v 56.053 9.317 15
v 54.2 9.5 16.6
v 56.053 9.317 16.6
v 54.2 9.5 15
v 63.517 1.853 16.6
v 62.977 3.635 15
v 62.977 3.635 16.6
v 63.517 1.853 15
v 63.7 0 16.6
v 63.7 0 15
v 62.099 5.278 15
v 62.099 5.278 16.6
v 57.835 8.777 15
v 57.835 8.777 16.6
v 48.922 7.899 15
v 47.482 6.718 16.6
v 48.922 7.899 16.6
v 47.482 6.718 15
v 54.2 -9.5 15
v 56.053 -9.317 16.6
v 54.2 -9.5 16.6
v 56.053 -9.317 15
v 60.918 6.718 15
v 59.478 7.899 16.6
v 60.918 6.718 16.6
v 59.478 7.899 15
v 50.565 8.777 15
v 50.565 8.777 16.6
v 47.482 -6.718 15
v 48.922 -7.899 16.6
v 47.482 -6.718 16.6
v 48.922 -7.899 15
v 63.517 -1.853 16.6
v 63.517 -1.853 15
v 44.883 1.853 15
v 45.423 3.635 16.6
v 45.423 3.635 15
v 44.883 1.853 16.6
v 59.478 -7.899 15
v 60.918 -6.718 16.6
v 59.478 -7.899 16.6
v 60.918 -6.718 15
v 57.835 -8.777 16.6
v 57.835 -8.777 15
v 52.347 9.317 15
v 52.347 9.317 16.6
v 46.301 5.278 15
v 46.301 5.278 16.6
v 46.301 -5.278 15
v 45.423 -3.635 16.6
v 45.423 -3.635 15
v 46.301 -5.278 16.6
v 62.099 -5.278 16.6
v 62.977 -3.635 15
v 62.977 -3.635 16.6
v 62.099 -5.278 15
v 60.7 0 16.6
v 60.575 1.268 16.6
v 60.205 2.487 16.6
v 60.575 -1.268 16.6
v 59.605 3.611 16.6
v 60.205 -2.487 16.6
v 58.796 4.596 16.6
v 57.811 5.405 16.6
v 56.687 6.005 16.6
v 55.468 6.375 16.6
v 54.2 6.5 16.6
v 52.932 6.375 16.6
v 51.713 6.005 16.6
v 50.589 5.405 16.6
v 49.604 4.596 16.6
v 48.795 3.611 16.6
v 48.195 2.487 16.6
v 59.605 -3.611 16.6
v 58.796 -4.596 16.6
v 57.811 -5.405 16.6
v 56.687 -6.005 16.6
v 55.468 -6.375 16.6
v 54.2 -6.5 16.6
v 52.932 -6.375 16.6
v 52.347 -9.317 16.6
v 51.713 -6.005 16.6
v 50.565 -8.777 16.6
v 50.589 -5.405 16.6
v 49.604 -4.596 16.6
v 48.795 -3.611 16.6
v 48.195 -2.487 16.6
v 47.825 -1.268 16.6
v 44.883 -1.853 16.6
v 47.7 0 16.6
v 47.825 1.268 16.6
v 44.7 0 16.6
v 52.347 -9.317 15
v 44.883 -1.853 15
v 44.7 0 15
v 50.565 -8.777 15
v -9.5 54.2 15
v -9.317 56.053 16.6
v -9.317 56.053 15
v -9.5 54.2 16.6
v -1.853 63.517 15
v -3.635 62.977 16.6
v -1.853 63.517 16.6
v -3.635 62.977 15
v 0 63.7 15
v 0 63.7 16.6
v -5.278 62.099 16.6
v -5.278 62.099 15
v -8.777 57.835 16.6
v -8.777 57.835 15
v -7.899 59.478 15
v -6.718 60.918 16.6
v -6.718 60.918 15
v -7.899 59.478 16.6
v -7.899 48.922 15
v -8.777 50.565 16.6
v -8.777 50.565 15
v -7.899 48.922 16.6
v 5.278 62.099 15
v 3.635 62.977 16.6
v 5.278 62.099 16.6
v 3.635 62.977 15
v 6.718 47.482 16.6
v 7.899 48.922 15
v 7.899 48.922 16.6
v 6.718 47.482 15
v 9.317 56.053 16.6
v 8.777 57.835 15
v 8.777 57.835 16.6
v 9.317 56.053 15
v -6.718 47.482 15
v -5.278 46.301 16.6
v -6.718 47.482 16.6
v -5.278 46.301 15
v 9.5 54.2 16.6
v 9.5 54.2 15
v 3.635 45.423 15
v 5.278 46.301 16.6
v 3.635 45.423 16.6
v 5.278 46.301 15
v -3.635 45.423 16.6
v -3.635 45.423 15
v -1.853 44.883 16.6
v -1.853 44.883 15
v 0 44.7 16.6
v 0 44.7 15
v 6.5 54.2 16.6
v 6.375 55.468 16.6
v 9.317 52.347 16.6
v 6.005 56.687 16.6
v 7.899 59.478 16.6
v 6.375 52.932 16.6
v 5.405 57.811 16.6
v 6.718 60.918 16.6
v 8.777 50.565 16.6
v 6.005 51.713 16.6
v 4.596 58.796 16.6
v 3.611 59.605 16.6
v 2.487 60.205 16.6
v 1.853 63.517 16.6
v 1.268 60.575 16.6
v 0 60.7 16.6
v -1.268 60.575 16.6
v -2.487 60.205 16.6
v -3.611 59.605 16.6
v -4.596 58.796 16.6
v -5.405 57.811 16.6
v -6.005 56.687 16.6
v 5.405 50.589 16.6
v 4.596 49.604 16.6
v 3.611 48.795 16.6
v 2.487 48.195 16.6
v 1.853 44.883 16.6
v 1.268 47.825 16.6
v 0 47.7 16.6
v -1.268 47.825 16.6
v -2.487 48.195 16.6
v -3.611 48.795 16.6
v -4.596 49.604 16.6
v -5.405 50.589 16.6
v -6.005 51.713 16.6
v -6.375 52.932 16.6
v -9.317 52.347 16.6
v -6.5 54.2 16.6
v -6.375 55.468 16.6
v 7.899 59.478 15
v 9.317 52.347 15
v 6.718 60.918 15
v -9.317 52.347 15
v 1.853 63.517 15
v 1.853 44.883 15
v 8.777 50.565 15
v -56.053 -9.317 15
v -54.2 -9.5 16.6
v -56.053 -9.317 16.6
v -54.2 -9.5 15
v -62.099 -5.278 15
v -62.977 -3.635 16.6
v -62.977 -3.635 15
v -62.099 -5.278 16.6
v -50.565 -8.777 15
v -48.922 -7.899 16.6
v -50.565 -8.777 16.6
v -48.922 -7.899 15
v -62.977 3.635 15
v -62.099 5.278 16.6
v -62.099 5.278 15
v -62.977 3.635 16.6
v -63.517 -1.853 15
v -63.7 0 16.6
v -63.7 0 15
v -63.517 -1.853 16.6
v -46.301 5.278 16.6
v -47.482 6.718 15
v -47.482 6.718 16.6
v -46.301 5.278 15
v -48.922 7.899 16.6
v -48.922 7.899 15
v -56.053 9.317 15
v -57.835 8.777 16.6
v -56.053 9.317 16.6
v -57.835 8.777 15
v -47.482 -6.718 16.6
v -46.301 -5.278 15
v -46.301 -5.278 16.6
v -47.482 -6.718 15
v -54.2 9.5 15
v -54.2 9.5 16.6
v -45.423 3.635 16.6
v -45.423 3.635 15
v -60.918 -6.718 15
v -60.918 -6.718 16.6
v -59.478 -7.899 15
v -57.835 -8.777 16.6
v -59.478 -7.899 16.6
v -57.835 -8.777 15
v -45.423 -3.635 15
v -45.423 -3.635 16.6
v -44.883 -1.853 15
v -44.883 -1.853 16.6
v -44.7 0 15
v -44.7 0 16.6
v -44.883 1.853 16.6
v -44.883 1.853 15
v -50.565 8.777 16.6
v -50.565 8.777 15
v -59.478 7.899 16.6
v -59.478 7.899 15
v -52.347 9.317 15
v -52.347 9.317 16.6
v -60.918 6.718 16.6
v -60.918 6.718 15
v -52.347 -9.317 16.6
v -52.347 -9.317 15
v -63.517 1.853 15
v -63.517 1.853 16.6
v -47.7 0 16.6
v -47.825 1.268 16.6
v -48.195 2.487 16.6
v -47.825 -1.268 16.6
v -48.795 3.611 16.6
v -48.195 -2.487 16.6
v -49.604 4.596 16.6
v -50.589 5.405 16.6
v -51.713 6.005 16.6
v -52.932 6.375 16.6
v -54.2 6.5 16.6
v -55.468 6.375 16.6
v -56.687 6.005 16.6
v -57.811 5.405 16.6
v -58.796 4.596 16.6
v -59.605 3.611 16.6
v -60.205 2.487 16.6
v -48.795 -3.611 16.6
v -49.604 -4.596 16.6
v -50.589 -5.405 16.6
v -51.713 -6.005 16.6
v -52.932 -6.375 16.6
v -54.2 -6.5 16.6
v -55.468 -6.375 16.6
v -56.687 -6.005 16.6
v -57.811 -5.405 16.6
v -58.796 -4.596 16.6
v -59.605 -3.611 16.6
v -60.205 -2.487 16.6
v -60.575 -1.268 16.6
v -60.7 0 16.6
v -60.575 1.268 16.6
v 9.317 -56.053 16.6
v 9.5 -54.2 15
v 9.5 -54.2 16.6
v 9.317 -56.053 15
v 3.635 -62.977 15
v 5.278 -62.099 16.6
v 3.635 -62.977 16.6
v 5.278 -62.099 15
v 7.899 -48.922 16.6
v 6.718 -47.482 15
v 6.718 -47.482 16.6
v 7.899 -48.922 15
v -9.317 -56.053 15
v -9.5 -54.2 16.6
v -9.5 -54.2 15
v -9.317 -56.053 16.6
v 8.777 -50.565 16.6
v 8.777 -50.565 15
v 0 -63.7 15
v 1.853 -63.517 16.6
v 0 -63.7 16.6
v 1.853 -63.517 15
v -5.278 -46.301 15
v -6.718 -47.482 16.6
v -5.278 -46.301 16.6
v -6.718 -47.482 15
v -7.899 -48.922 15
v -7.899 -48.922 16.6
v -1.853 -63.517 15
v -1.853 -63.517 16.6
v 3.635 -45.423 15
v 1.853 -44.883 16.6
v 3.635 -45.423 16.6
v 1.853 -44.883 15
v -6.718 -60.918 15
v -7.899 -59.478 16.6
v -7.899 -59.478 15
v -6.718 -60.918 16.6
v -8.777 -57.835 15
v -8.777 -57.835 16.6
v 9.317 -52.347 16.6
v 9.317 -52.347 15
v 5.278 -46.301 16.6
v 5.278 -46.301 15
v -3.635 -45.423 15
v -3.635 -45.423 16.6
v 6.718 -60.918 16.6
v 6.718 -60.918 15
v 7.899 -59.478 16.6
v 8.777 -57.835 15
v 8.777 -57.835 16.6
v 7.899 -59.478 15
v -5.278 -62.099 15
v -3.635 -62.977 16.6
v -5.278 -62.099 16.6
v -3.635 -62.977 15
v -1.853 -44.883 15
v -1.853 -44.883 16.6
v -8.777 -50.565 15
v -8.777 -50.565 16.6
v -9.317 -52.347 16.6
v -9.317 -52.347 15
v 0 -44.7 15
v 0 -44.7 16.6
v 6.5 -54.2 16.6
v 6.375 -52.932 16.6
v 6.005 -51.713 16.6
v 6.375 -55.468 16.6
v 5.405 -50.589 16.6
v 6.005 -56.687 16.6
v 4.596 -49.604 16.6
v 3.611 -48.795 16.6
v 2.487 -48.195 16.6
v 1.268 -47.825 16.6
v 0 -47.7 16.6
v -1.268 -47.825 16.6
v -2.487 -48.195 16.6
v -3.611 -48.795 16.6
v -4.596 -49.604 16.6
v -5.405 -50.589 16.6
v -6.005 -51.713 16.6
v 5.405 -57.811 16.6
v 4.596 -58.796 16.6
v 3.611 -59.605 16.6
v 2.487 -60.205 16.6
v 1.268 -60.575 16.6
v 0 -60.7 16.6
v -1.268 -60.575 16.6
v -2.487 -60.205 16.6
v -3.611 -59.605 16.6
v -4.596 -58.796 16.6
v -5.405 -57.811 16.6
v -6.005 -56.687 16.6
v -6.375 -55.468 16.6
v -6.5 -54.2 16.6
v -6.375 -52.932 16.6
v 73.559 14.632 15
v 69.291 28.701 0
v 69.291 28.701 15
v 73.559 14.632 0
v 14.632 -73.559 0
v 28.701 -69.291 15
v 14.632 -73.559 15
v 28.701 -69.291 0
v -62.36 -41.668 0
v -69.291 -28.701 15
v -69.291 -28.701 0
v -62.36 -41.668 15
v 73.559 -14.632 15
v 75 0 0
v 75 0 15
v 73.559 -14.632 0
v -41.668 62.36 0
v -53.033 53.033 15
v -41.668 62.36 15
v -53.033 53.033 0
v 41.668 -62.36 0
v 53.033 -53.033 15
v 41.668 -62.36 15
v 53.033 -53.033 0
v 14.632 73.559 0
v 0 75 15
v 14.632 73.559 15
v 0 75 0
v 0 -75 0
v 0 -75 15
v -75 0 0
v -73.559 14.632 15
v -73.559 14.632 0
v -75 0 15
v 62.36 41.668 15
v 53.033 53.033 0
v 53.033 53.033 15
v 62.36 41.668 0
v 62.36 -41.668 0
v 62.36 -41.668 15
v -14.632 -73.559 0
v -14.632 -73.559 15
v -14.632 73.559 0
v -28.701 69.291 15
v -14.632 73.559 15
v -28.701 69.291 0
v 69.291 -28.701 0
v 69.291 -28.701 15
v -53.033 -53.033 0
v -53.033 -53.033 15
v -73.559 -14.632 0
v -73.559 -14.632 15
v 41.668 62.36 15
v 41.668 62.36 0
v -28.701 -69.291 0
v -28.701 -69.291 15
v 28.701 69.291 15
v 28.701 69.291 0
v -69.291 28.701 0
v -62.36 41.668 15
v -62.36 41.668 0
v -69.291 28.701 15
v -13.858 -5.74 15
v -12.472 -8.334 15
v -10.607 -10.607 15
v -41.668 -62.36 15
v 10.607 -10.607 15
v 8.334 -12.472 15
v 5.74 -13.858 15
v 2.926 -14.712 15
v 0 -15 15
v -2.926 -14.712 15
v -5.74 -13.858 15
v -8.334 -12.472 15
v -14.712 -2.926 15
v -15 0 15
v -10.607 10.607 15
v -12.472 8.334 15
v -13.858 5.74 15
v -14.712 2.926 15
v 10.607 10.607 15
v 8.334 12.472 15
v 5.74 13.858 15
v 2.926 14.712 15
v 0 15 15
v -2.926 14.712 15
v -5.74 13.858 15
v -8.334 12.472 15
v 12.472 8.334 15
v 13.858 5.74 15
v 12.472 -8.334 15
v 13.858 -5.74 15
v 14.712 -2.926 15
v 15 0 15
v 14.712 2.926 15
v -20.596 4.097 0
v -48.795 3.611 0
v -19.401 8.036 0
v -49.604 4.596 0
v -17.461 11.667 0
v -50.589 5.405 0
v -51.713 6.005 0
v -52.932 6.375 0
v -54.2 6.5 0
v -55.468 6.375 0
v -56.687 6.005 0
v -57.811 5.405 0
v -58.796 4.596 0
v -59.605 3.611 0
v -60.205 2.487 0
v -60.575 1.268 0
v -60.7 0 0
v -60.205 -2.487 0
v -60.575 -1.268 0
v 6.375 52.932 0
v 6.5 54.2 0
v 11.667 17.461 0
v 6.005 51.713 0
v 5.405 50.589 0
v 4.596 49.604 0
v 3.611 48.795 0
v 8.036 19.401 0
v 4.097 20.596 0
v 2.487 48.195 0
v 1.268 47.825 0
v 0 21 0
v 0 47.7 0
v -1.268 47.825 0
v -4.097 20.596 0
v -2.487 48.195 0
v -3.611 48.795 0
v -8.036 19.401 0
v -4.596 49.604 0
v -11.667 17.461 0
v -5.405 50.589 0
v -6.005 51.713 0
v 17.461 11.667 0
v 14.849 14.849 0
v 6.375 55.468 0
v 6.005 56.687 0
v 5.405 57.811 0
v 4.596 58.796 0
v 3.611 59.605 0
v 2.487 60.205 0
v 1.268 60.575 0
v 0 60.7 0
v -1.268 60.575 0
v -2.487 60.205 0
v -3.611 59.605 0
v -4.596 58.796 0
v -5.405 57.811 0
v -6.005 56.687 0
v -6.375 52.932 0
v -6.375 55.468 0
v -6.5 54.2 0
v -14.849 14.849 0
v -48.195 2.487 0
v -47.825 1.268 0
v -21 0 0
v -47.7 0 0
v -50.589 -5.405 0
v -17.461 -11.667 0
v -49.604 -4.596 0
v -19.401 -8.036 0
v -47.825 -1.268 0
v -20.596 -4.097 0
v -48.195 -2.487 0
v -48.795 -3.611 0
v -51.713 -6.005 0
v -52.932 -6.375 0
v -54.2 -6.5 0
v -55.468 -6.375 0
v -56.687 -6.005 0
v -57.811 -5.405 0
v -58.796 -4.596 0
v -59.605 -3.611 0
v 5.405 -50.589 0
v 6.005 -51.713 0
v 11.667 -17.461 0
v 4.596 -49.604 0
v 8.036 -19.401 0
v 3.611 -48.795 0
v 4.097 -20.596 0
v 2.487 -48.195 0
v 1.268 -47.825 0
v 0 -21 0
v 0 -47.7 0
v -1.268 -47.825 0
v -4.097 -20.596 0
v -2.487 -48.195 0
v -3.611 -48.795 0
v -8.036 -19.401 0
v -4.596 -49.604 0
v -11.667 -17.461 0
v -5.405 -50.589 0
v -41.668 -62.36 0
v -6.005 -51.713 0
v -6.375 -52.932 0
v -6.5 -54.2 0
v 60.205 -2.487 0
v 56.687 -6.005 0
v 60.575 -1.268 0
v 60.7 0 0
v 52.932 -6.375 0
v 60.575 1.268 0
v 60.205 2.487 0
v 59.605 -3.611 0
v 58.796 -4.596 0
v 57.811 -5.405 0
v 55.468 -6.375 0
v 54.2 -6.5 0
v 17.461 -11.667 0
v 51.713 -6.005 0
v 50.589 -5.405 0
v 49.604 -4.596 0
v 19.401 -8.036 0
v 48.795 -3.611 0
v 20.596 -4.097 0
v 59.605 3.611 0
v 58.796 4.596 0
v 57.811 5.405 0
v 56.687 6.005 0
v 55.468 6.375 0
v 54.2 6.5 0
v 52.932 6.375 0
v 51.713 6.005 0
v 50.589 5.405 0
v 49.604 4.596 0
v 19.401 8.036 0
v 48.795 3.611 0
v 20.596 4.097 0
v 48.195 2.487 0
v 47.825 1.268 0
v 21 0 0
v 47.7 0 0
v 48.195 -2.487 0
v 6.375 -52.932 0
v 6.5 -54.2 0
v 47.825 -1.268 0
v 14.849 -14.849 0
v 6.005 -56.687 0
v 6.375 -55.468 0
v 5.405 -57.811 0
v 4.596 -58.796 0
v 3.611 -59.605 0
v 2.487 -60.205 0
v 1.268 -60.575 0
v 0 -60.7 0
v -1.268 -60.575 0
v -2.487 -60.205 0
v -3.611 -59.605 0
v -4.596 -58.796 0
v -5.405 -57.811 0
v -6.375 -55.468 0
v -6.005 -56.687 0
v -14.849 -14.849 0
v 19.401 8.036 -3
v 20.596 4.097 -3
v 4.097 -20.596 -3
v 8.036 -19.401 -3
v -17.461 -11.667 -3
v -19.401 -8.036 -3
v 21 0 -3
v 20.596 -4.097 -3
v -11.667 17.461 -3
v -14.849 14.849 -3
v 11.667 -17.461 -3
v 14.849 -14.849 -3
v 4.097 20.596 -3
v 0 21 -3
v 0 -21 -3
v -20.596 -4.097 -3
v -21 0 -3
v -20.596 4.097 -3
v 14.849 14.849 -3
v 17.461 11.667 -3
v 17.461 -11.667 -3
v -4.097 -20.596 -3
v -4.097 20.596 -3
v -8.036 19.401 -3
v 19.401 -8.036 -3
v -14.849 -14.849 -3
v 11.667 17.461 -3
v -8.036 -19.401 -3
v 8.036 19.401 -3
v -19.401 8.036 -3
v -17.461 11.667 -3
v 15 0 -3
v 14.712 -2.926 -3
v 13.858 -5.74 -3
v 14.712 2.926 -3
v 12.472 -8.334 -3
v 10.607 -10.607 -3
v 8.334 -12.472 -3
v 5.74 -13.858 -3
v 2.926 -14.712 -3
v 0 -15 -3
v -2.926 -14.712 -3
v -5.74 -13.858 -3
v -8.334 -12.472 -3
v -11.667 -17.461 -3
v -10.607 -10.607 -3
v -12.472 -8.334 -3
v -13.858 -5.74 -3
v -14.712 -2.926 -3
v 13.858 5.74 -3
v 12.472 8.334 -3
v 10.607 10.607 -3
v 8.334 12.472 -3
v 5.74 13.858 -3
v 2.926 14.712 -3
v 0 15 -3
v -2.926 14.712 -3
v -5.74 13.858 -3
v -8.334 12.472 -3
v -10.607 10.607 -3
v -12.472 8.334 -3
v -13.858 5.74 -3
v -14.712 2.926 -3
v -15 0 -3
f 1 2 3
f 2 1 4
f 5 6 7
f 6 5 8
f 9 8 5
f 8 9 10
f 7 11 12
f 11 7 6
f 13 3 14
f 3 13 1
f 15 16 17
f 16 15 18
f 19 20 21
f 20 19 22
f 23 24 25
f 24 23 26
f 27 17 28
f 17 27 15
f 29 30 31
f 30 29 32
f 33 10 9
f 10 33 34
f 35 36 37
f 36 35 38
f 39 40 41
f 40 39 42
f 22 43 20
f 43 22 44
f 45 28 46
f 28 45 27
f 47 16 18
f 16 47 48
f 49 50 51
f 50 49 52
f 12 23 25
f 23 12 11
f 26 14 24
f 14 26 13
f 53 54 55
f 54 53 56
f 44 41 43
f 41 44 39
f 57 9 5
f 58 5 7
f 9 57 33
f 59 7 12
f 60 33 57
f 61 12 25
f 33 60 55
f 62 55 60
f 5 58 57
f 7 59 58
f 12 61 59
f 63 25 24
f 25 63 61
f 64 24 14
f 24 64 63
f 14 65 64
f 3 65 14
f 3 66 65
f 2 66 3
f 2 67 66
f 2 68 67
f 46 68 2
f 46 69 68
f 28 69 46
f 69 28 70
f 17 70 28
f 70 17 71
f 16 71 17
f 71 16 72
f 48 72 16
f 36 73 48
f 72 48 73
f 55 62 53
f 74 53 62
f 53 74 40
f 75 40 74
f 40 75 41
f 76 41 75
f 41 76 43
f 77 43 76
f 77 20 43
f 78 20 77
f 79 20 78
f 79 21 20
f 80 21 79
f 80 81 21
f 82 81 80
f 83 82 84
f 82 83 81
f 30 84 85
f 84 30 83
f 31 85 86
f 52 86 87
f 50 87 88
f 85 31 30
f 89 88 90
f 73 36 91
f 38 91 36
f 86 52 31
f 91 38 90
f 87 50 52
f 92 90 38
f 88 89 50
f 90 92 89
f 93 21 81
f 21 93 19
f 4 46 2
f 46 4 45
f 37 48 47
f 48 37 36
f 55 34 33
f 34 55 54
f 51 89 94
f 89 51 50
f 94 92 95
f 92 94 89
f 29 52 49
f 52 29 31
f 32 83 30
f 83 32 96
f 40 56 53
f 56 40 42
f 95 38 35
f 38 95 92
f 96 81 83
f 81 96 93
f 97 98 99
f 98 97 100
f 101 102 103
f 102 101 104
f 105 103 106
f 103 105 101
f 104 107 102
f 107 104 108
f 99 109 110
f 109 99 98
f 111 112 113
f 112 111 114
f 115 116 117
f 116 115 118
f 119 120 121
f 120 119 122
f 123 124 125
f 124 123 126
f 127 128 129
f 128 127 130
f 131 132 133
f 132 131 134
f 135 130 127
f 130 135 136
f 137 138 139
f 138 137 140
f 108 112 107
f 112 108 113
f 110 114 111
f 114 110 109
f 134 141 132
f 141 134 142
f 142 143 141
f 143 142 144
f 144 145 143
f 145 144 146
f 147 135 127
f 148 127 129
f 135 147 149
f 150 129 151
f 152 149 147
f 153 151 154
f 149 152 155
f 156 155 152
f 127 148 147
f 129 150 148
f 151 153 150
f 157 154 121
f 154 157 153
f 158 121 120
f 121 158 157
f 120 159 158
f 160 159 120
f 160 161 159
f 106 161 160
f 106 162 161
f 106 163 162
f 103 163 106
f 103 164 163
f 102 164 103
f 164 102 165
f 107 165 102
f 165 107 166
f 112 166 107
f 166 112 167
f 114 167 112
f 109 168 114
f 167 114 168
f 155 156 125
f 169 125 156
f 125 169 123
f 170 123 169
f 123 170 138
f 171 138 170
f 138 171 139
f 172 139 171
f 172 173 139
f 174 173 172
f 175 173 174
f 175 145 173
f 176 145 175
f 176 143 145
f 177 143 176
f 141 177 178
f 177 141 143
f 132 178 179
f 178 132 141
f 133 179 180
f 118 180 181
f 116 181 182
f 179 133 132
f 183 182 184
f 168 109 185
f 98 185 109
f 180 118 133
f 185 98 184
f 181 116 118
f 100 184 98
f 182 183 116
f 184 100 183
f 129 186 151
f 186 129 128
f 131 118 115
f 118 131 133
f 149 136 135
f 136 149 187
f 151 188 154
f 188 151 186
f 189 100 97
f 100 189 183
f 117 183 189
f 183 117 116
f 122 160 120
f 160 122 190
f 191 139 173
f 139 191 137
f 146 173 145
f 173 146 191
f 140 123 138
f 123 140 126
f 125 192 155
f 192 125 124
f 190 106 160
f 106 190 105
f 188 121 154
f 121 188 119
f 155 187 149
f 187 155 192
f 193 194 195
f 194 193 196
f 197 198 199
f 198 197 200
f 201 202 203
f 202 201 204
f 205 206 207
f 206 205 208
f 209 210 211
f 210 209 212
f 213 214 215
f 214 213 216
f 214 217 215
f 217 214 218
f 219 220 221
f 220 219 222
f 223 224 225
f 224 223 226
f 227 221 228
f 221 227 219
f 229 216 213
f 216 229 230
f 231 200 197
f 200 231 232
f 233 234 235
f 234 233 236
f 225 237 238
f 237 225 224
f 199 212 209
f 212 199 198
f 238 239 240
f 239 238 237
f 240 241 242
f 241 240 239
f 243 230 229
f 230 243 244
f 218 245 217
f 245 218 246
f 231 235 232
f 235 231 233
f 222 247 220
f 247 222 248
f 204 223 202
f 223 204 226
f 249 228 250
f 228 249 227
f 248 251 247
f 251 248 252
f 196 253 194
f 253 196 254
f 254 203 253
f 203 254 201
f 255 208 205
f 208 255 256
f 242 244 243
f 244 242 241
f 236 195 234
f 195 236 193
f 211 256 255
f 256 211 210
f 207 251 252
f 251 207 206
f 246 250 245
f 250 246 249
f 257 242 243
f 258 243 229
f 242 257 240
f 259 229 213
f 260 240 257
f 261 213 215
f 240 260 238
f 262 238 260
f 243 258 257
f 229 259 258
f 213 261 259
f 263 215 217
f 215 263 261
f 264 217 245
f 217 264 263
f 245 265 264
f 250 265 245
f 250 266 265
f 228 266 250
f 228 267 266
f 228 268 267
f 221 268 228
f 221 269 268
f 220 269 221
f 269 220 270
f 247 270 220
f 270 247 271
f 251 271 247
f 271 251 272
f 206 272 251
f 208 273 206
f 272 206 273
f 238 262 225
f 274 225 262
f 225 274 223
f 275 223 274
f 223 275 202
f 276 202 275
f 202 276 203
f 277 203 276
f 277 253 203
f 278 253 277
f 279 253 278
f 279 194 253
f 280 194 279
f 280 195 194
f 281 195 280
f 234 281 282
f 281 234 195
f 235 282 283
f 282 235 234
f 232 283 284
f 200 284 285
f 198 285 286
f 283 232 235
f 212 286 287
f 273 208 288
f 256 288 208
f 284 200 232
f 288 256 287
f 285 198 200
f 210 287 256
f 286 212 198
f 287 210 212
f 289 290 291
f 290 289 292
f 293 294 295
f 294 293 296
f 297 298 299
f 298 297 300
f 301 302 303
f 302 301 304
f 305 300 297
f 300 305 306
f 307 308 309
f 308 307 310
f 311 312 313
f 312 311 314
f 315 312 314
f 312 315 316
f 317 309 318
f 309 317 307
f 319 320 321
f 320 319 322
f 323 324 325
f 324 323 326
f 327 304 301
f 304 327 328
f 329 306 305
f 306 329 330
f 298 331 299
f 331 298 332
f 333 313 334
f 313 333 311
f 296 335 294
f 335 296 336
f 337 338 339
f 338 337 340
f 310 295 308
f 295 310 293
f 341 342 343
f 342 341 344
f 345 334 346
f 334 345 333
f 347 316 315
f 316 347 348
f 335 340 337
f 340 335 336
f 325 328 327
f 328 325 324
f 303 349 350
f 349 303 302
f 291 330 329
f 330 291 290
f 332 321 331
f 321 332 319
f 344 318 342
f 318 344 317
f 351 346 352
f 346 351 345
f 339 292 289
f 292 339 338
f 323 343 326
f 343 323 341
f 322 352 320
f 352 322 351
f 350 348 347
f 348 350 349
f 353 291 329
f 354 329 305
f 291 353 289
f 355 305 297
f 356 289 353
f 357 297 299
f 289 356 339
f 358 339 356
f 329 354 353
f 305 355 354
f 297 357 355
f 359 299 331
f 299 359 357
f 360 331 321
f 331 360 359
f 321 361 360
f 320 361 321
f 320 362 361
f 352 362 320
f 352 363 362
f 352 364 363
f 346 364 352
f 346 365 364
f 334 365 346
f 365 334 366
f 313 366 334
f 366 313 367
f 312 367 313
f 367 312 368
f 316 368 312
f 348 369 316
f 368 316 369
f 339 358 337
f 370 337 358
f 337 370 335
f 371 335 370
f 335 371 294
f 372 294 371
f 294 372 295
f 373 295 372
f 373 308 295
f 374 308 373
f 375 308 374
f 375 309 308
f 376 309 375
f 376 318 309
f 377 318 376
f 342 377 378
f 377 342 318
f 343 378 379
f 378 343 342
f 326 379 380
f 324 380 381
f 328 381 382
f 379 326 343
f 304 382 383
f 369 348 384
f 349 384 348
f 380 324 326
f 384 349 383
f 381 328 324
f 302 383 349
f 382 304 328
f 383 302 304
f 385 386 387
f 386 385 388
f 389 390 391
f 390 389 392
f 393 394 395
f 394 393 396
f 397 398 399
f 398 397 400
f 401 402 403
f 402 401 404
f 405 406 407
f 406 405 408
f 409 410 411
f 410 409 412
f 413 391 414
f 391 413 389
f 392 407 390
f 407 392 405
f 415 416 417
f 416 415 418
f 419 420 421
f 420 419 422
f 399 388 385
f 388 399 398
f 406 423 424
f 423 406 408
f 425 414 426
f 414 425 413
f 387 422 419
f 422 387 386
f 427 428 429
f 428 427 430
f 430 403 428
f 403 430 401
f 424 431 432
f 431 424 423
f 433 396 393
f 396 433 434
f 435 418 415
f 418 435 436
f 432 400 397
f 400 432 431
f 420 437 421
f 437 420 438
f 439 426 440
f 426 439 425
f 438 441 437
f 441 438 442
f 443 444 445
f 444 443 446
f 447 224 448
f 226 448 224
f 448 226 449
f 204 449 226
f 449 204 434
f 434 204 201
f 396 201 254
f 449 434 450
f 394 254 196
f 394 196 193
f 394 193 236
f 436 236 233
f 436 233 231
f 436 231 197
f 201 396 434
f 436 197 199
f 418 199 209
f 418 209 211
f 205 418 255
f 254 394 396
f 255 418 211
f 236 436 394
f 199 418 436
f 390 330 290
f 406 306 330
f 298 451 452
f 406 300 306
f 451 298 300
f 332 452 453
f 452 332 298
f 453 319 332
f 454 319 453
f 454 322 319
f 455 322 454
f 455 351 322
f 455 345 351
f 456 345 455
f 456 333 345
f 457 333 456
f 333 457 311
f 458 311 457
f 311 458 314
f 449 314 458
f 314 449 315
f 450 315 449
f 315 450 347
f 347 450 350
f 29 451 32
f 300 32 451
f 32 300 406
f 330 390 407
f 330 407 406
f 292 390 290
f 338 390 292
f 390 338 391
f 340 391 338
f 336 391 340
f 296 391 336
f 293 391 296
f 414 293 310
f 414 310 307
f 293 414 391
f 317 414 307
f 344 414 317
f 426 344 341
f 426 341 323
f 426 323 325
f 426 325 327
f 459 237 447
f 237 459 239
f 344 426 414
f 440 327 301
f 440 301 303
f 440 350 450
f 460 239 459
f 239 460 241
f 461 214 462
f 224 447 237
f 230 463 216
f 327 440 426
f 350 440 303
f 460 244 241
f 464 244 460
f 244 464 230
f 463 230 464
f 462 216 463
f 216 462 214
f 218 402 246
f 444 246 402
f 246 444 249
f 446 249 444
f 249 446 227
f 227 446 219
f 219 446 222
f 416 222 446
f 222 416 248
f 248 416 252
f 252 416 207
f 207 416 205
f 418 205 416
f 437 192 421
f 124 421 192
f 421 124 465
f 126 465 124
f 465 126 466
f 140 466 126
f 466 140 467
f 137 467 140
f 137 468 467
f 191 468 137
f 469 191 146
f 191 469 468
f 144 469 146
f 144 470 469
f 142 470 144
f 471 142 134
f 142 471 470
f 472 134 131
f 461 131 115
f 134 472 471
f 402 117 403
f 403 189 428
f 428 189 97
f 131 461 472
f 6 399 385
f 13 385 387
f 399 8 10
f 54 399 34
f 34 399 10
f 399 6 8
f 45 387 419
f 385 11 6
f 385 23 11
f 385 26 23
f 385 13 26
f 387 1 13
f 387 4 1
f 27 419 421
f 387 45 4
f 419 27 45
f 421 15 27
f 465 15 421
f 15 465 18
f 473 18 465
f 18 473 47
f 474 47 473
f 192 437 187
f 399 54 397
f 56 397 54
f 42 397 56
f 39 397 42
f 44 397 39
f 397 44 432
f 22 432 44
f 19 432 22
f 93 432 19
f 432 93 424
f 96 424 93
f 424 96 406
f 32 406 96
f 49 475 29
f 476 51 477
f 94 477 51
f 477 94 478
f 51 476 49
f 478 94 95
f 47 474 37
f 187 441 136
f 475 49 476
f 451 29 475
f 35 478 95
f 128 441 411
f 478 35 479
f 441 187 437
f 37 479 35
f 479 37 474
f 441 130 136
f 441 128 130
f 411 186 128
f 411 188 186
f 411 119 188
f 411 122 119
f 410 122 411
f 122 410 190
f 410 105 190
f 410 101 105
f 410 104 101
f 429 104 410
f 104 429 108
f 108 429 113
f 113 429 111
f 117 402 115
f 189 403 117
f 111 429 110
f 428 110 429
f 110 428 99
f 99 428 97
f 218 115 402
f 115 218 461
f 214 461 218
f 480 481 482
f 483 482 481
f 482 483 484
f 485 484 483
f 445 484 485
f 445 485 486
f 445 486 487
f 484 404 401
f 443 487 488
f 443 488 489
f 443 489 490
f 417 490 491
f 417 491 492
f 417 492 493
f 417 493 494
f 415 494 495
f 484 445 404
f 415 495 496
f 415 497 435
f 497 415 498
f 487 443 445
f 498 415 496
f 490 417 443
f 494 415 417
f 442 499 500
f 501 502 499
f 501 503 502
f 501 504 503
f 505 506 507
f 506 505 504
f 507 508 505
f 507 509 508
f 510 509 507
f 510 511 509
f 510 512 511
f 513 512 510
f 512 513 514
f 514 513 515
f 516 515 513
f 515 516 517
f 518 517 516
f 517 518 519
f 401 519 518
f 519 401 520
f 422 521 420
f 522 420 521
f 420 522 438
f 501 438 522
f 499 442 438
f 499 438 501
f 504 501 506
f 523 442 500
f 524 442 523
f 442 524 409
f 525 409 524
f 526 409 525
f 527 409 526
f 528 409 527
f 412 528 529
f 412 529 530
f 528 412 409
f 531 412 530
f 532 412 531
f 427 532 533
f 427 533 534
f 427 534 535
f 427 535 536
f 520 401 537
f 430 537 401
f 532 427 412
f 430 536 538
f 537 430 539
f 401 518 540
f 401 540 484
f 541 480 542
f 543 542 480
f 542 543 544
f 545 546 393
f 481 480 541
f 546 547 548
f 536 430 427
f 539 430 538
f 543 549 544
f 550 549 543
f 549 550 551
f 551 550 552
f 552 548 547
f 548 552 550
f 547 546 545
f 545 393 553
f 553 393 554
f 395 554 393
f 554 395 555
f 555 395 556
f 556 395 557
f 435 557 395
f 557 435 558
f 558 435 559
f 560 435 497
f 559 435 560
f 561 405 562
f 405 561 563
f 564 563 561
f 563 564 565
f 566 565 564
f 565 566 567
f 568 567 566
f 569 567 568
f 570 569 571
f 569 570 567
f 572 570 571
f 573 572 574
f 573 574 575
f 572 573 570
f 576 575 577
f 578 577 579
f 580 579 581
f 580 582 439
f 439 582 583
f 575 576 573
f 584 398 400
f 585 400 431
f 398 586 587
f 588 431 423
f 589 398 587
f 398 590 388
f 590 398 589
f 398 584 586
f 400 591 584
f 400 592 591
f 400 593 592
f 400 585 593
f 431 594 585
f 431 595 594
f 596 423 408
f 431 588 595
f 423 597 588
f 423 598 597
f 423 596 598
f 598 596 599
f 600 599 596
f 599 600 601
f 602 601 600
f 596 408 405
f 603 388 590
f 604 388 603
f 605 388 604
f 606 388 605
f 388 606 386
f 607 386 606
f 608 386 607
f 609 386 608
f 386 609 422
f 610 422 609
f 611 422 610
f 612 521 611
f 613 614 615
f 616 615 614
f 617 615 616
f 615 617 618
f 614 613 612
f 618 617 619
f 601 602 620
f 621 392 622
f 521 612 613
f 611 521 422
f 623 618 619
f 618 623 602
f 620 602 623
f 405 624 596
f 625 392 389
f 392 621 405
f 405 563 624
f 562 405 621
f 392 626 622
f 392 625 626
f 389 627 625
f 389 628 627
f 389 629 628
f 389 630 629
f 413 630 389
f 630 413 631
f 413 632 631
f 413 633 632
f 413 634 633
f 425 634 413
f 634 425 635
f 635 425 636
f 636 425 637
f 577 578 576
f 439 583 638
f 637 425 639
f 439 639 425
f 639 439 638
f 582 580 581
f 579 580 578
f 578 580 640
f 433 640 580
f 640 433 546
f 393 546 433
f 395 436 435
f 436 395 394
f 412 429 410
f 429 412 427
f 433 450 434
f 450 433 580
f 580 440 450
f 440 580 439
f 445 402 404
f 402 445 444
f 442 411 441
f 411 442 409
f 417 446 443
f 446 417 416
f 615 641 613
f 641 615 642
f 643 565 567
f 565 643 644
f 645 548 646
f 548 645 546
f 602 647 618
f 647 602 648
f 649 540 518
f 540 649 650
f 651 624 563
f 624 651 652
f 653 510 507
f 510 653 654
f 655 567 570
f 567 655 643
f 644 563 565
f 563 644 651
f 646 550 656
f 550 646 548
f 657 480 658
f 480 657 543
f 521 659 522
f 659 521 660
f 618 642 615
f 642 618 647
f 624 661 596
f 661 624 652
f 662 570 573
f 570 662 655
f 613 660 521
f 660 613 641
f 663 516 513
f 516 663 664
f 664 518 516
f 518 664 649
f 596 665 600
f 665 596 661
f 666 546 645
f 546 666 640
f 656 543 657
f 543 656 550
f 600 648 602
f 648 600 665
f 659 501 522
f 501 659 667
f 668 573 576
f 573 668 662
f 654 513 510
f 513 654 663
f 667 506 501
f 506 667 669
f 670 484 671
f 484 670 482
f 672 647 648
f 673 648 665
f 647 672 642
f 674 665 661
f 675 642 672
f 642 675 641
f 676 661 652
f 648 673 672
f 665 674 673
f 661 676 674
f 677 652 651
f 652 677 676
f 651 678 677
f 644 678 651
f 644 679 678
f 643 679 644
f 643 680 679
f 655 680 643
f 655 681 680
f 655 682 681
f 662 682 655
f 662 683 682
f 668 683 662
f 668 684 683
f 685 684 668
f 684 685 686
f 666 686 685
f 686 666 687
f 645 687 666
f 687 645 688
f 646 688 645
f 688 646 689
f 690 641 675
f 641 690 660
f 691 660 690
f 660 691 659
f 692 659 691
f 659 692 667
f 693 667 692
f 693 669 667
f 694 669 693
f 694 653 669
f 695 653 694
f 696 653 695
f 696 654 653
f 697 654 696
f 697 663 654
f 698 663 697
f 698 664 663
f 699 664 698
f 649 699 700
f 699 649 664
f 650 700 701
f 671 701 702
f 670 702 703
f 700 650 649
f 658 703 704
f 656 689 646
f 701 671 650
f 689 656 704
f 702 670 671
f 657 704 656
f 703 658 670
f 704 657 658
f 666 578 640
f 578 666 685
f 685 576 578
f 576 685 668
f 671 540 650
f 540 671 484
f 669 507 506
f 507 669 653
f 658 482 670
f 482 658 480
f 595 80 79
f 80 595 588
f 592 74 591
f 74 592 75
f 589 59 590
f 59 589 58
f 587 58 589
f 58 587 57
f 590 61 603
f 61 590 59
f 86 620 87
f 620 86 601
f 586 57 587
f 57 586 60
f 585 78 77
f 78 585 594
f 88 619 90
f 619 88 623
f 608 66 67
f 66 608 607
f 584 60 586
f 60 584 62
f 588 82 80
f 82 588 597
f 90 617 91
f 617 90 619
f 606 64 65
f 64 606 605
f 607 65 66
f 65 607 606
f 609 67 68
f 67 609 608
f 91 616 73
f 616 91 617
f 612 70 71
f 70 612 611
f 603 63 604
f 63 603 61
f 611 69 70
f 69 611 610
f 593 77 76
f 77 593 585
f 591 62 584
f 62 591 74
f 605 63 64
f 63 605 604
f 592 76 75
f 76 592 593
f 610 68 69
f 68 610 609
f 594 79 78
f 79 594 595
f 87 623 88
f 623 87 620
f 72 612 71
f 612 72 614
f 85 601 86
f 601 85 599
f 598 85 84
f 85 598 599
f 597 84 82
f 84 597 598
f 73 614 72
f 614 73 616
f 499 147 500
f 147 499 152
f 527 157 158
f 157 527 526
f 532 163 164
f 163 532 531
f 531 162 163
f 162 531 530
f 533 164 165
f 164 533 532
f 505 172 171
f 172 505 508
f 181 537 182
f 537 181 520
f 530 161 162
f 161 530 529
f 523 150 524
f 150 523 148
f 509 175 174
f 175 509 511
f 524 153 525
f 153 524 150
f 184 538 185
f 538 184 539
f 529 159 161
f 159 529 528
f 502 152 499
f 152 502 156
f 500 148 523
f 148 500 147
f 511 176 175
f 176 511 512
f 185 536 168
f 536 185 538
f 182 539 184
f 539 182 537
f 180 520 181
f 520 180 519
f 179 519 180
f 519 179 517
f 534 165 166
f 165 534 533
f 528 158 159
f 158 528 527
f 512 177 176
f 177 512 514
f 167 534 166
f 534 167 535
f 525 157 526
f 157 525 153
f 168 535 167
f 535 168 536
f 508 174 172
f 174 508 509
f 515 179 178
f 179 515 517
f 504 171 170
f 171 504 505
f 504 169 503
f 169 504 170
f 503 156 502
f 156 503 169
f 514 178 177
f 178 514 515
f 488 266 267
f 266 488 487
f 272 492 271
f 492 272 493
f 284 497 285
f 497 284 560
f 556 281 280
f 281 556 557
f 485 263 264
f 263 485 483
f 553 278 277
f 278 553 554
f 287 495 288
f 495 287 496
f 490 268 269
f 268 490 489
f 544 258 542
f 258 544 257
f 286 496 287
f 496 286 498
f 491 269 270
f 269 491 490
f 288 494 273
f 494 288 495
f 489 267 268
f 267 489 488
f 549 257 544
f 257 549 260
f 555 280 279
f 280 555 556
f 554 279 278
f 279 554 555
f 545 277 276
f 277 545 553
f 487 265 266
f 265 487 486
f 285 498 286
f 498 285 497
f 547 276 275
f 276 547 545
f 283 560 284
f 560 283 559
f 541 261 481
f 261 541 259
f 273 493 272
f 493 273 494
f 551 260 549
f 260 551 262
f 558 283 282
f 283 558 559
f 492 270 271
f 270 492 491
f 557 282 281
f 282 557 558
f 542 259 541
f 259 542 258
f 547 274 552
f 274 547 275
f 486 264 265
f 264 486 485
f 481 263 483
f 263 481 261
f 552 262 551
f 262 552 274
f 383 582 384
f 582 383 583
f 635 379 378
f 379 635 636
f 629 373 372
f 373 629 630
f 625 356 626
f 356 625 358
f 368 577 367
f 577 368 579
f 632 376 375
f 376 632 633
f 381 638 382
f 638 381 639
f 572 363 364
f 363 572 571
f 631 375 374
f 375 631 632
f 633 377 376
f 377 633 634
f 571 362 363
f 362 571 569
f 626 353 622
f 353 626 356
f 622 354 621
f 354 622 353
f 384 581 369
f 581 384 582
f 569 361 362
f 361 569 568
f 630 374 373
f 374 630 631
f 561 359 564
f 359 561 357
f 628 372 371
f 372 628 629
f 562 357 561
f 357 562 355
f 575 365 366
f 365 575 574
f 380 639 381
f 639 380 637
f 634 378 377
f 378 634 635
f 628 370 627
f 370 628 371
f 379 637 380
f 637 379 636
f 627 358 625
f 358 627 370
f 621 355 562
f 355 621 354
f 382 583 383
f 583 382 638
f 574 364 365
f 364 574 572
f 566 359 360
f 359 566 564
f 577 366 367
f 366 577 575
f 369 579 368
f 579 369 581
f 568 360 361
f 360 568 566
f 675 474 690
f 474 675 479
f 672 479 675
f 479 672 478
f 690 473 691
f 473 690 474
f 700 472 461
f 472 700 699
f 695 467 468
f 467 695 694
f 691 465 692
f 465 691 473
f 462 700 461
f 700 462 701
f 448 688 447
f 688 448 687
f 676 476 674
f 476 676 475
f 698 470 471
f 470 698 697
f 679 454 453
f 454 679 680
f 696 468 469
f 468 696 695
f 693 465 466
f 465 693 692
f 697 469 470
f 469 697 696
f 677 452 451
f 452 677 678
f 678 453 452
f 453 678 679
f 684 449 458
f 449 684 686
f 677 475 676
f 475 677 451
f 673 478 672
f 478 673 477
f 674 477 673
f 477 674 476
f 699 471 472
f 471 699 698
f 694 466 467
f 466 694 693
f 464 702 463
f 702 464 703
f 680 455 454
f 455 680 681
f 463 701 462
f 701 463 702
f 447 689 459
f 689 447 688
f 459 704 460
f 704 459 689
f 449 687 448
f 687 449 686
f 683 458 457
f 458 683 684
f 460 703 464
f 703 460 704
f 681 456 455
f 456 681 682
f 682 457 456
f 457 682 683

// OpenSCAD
$fn = 32;

// ----------------------------------------------------------------------
// Bolt-circle flange: 150 mm outside, 4 bolt holes, bore 30 mm
// ----------------------------------------------------------------------

// --- parameters (mm) ---
flange_d = 150;           // flange outside diameter
flange_t = 15;            // flange thickness
bolts = 4;                // number of bolt holes
bolt_d = 13;              // bolt clearance
bolt_r = 54.2;            // bolt circle radius
bore_d = 30;              // centre bore
spigot_d = 42;            // spigot diameter
spigot_h = 4;             // spigot height below the flange
sink = 1;                 // overlap into the flange
spot_d = 19;              // spot faced bosses
spot_h = 1.6;             // spot face height

module body() {
  cylinder(h = flange_t, d = flange_d);
  /* spigot on the back face, sunk into the flange */
  translate([0, 0, -spigot_h + sink]) cylinder(h = spigot_h, d = spigot_d);
  /* spot faced pads under the bolt heads */
  for (i = [0 : bolts - 1]) rotate([0, 0, i * 360 / bolts]) translate([bolt_r, 0, flange_t - 1]) cylinder(h = spot_h + 1, d = spot_d);
}

difference() {
  body();
  /* bolt circle */
  for (i = [0 : bolts - 1]) rotate([0, 0, i * 360 / bolts]) translate([bolt_r, 0, -spigot_h - 1]) cylinder(h = flange_t + spigot_h + 3, d = bolt_d);
  translate([0, 0, -spigot_h - 1]) cylinder(h = flange_t + spigot_h + 3, d = bore_d);
}
